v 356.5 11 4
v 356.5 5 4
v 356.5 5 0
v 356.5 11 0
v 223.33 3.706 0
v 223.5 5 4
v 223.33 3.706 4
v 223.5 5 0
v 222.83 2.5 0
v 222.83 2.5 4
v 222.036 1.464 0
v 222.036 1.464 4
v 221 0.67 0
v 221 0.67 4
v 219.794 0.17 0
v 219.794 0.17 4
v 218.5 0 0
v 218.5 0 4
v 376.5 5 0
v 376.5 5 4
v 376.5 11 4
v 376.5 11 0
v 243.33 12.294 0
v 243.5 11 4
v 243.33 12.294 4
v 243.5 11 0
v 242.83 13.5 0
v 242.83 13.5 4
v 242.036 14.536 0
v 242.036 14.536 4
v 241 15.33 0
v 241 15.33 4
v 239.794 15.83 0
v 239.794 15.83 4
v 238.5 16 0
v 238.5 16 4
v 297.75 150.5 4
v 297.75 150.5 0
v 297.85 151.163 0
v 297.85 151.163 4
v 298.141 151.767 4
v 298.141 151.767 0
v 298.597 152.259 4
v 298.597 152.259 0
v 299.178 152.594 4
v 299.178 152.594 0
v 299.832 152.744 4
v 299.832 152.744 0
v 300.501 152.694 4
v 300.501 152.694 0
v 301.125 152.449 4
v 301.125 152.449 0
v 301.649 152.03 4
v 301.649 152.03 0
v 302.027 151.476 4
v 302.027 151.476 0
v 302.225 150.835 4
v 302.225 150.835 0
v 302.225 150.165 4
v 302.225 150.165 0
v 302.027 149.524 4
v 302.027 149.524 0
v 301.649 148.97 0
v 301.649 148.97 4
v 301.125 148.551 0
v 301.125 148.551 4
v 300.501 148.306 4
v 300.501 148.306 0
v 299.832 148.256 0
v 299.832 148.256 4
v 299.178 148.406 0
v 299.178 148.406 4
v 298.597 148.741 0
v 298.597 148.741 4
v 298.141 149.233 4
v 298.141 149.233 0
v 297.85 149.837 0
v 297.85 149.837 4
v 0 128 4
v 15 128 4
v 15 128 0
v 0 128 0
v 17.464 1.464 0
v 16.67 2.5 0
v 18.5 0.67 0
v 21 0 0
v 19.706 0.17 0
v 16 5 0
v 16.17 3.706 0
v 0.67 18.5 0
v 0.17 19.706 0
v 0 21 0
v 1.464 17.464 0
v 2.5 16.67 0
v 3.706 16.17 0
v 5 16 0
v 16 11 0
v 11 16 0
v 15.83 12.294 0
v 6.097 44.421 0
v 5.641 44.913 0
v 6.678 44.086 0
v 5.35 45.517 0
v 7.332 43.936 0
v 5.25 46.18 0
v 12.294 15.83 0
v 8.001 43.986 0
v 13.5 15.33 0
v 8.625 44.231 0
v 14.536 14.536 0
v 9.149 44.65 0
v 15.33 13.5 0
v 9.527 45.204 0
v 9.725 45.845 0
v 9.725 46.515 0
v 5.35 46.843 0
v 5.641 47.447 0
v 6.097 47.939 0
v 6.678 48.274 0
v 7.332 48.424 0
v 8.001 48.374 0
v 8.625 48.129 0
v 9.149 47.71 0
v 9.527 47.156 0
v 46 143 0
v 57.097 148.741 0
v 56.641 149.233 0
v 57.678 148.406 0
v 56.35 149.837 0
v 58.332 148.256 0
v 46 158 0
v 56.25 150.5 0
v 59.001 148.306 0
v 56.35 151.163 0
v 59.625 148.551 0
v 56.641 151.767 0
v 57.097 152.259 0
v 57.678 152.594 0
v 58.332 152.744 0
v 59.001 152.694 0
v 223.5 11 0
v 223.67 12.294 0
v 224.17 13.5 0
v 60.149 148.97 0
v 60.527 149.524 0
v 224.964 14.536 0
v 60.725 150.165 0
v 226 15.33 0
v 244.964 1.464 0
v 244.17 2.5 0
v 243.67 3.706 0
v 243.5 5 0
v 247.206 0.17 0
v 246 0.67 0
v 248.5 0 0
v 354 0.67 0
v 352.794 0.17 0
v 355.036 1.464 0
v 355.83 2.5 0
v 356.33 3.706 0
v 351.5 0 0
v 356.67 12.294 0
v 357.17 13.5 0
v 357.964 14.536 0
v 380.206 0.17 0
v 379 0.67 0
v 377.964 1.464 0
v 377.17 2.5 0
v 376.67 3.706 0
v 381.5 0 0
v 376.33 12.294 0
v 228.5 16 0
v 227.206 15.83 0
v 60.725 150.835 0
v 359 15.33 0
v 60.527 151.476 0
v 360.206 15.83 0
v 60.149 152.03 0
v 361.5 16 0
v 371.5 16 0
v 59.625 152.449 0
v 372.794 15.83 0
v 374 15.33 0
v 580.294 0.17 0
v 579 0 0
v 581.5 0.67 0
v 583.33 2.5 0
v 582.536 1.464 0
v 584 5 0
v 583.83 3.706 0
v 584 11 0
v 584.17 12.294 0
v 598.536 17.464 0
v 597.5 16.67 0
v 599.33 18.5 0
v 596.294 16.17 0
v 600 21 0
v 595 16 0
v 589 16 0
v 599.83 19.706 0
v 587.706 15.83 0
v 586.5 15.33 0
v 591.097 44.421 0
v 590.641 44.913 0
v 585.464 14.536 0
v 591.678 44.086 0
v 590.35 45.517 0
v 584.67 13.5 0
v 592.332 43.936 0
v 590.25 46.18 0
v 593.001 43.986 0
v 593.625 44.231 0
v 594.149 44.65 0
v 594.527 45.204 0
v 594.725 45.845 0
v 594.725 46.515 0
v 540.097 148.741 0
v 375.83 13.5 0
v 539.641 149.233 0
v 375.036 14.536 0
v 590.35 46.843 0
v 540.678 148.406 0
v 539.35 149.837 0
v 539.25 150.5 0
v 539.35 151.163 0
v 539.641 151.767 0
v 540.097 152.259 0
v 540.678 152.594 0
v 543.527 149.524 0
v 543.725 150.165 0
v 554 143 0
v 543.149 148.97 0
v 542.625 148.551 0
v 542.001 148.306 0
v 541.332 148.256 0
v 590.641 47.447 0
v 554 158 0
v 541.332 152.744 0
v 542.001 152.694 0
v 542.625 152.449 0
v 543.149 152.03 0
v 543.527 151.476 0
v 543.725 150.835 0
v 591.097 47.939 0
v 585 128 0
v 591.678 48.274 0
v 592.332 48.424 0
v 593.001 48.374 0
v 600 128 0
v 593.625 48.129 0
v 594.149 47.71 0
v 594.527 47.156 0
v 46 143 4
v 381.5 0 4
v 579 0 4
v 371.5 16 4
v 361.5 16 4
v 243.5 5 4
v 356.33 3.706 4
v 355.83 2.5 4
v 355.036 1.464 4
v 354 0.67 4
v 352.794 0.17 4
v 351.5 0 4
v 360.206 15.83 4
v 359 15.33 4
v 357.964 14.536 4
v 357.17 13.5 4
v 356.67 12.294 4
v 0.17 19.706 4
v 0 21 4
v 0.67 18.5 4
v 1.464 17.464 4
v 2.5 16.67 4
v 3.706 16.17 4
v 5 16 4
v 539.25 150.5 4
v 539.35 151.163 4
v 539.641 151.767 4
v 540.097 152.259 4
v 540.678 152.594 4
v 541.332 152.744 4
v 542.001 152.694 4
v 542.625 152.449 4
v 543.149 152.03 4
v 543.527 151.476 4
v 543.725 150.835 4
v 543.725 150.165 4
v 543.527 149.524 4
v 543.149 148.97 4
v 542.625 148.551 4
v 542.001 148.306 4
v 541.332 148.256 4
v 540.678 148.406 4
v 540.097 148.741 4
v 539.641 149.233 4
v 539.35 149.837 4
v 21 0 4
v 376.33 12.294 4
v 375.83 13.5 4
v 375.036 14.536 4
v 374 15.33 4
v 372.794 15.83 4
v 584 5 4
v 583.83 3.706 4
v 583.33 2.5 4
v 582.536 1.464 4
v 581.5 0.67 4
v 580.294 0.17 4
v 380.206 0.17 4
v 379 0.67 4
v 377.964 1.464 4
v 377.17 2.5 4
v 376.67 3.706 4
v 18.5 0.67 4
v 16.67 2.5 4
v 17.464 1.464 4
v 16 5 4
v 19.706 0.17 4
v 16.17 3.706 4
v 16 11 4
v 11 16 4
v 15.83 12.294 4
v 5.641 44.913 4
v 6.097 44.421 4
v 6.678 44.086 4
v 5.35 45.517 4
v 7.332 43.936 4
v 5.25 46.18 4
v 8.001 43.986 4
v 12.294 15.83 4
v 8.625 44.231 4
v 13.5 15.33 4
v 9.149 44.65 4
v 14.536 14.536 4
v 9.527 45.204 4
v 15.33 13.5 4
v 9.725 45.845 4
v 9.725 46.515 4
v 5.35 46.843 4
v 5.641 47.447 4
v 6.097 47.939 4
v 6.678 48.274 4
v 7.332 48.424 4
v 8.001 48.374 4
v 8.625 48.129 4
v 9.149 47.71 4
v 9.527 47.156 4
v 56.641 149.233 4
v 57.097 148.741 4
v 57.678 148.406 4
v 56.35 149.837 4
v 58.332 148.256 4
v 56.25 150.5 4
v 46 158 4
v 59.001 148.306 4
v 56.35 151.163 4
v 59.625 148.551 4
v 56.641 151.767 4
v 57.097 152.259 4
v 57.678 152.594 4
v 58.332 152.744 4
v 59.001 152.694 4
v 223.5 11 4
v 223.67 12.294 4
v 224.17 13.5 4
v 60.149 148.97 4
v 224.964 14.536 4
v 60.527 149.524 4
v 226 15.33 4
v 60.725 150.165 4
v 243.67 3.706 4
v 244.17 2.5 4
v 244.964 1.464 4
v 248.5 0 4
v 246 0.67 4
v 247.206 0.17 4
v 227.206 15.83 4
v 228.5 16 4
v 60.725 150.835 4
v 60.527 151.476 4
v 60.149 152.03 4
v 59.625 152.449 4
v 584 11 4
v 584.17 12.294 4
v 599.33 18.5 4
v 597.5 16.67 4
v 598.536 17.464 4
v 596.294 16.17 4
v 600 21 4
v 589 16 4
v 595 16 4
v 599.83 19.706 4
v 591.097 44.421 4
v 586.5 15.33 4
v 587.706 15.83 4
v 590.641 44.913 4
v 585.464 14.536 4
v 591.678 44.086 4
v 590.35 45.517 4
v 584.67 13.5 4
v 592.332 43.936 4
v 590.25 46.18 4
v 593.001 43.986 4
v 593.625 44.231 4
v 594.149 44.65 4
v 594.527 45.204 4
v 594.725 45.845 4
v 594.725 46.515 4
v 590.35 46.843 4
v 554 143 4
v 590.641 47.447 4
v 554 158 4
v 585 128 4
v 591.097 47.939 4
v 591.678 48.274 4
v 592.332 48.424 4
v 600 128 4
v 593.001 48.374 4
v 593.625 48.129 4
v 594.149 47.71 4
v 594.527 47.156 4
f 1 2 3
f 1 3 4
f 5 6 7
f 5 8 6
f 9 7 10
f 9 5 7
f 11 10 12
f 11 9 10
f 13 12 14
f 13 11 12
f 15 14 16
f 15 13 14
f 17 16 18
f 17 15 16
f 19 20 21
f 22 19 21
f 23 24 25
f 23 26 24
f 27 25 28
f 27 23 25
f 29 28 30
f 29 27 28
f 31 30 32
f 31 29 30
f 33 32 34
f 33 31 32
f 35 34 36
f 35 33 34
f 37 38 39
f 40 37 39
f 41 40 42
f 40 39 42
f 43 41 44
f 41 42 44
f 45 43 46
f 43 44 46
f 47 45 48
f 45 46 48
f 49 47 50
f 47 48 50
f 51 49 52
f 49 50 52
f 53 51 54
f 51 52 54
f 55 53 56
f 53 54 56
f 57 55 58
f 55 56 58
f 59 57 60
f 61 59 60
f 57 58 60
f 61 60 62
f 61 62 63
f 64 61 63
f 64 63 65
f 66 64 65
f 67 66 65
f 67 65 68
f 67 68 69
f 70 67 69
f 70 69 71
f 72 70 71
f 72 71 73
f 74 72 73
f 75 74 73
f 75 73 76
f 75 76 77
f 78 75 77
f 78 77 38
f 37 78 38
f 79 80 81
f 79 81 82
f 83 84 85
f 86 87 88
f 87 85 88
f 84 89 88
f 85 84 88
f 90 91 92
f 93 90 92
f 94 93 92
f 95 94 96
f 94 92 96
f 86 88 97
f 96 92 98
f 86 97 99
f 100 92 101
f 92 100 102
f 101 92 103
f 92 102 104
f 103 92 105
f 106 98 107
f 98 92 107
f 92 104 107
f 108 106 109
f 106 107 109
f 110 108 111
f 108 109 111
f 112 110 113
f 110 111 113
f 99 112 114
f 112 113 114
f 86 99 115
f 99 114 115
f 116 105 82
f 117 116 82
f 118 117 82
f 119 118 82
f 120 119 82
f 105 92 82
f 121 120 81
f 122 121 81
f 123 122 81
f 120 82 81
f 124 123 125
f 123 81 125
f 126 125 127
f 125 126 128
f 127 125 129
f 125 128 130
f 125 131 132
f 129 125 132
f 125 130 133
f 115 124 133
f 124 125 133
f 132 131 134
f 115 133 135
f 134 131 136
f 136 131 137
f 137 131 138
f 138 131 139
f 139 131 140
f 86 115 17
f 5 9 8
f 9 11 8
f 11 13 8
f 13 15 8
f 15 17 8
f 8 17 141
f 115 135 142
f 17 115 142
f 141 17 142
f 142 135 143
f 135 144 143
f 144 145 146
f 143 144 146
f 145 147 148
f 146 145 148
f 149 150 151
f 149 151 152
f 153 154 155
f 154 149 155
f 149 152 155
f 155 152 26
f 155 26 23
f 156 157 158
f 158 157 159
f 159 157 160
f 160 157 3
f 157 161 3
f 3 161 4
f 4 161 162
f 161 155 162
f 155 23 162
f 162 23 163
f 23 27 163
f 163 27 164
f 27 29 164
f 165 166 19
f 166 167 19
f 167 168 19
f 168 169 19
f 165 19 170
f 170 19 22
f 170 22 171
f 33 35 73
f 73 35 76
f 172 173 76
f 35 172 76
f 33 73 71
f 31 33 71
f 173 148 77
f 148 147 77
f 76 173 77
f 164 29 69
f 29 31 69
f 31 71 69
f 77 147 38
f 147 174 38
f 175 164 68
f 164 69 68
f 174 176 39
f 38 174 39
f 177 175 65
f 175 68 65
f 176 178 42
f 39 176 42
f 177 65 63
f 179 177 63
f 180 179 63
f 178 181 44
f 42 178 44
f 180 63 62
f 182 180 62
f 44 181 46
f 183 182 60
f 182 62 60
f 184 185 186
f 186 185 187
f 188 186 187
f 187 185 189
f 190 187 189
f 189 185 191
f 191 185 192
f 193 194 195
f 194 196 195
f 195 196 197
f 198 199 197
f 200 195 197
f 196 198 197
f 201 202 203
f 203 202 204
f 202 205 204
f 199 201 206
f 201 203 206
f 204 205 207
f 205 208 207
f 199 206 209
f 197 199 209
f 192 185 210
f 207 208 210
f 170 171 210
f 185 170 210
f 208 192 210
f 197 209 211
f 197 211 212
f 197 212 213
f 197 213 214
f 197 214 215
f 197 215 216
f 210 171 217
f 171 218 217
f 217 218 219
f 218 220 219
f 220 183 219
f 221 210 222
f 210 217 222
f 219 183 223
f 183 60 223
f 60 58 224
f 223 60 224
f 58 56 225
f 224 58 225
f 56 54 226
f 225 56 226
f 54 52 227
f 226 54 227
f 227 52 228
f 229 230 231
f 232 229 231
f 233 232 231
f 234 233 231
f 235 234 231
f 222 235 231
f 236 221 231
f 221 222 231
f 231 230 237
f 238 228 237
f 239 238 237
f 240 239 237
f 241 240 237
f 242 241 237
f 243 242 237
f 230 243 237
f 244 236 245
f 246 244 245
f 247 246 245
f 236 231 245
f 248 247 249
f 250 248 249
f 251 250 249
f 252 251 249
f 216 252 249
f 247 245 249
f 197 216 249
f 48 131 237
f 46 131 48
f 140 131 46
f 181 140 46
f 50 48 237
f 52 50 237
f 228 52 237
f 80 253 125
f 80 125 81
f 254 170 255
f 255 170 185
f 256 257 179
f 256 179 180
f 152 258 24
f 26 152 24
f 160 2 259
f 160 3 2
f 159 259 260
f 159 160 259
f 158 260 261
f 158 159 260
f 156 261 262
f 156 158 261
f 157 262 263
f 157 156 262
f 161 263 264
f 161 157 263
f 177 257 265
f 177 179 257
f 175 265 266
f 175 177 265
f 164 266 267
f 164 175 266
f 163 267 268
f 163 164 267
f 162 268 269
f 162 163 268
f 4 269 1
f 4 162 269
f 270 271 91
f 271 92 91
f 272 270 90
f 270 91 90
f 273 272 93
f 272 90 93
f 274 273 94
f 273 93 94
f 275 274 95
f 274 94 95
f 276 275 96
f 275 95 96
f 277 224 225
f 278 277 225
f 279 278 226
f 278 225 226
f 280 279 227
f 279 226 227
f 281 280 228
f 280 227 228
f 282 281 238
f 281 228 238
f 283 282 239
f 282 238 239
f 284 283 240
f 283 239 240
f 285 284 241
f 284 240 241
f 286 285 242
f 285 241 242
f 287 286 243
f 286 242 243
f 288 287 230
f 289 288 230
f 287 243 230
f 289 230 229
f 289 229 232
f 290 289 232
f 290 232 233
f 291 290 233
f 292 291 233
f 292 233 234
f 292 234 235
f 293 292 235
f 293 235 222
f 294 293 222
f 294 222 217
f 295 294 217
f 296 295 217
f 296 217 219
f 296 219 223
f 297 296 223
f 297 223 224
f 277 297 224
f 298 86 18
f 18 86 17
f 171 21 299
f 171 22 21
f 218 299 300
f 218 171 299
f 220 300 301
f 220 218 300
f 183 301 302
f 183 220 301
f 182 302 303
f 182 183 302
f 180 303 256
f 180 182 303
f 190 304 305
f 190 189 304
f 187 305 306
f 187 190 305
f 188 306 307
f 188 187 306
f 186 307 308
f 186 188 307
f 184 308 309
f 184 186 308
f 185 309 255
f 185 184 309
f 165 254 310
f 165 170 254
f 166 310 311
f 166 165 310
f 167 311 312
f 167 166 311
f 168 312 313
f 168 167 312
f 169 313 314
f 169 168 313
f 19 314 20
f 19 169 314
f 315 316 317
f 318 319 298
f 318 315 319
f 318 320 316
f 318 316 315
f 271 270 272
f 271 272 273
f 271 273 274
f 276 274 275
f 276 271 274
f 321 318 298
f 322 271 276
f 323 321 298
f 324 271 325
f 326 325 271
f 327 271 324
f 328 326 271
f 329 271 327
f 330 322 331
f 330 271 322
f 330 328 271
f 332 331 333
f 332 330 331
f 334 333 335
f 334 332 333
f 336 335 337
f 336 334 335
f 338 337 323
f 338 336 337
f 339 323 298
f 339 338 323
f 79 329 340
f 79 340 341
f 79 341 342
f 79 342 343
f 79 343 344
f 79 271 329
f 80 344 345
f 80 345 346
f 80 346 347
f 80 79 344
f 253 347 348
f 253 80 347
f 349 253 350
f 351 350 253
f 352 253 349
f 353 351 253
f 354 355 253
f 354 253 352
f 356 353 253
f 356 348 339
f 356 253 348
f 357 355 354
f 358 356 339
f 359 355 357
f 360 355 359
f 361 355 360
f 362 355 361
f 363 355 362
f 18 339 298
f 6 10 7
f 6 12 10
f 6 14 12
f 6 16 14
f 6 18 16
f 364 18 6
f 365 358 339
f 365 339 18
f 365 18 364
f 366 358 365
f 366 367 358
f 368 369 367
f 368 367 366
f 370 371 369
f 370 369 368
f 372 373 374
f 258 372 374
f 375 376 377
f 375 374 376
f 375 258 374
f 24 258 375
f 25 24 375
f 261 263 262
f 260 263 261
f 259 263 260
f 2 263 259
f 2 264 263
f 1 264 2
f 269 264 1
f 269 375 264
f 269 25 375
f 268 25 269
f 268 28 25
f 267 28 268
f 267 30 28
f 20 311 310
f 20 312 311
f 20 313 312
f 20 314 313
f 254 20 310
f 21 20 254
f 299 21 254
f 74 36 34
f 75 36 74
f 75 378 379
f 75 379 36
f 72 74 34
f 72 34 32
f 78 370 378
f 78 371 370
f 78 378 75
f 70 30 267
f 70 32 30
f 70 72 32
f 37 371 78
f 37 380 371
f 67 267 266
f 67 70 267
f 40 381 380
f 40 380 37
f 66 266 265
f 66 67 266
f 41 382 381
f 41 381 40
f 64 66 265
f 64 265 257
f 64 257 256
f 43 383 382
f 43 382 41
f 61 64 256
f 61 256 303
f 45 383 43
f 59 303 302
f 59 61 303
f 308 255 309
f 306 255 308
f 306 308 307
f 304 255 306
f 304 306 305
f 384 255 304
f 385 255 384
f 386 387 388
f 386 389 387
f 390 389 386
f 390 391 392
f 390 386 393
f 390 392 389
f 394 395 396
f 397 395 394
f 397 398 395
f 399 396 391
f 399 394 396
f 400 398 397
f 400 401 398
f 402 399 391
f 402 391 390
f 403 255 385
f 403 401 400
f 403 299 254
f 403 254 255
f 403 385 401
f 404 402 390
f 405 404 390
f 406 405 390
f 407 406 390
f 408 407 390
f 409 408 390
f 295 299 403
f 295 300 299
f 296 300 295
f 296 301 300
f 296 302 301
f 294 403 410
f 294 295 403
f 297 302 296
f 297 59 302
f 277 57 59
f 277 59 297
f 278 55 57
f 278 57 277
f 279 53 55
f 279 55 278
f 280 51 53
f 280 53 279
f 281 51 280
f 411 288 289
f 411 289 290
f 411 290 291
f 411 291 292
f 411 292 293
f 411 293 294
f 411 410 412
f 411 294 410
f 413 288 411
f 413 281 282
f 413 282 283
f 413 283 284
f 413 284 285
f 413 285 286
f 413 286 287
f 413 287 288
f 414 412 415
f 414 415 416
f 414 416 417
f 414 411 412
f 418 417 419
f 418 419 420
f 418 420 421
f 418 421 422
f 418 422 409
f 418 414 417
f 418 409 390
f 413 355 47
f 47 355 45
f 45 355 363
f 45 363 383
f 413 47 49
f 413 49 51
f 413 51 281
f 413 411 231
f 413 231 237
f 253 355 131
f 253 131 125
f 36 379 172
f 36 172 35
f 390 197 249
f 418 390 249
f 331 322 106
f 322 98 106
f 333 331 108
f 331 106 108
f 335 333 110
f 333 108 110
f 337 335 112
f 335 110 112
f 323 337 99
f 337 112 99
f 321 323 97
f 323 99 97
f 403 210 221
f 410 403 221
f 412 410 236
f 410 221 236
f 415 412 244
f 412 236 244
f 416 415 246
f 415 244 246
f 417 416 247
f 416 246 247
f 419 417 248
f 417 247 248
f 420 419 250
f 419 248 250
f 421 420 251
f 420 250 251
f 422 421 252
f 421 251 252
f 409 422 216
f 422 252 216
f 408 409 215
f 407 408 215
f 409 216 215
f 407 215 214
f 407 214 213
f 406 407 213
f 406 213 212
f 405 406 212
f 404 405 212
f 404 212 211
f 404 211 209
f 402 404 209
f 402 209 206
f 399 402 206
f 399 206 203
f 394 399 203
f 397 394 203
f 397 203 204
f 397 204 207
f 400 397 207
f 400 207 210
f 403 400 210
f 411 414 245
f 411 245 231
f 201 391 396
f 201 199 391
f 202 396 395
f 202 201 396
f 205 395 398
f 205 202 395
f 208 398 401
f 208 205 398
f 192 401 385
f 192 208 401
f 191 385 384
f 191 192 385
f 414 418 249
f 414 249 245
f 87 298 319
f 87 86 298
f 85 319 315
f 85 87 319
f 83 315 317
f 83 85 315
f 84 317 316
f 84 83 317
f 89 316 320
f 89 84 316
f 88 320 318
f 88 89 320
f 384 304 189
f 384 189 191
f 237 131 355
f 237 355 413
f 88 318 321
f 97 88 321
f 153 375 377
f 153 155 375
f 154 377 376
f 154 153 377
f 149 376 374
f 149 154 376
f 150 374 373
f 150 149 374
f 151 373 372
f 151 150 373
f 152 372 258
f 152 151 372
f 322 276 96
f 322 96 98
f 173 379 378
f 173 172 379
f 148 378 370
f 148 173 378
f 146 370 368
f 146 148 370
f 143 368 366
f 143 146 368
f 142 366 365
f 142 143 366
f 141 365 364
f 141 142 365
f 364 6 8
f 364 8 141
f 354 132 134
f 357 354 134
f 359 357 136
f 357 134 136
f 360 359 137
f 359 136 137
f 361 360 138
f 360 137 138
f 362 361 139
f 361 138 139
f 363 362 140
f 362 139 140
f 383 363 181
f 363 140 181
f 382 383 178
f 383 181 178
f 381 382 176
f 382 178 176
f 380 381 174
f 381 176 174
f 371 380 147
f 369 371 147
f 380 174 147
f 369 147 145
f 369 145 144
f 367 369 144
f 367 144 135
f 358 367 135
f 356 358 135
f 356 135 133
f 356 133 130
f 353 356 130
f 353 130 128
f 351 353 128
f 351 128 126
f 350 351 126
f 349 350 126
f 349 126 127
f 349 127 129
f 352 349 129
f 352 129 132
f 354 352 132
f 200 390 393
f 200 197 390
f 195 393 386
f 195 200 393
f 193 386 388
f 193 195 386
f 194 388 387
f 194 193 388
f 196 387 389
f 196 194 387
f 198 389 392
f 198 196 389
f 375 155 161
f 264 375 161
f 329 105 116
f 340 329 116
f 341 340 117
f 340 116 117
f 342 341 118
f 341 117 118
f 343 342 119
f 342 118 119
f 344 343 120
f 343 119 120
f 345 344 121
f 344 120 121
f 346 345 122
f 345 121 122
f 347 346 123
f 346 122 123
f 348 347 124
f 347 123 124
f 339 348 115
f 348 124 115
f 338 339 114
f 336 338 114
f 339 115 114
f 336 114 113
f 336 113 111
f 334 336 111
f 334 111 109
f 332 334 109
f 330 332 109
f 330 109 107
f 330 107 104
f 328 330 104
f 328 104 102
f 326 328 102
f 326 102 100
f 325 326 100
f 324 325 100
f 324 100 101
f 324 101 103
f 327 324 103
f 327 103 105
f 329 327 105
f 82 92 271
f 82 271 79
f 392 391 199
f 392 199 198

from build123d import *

# Parameters (mm, degrees)
SKETCH_1_W          = 600
SKETCH_1_H          = 158
EXTRUDE_1_DEPTH     = 4
SKETCH_2_W          = 20
SKETCH_2_H          = 16
SKETCH_2_W_2        = 16
CUT_EXTRUDE_1_DEPTH = 10
FILLET_1_R          = 5
HOLE_WIZARD_M4_1_D  = 4.5


with BuildPart() as part:
    # ｽｹｯﾁ1 → ﾎﾞｽ - 押し出し1 (new body)
    with BuildSketch(Plane.XY):
        with Locations((300, 79)):
            Rectangle(SKETCH_1_W, SKETCH_1_H)
    extrude(amount=EXTRUDE_1_DEPTH)

    # ｽｹｯﾁ2 → ｶｯﾄ - 押し出し1 (cut)
    with BuildSketch(Plane.XY.offset(4)):
        Polygon((46, 158), (46, 143), (15, 128), (0, 128), (0, 158), align=None)
        Polygon((600, 158), (600, 128), (585, 128), (554, 143), (554, 158), align=None)
        with Locations((366.5, 8)):
            Rectangle(SKETCH_2_W, SKETCH_2_H)
        with Locations((8, 8)):
            Rectangle(SKETCH_2_W_2, SKETCH_2_H)
        with Locations((233.5, 8)):
            Rectangle(SKETCH_2_W, SKETCH_2_H)
        with Locations((592, 8)):
            Rectangle(SKETCH_2_W_2, SKETCH_2_H)
    extrude(amount=-CUT_EXTRUDE_1_DEPTH, mode=Mode.SUBTRACT)

    # ﾌｨﾚｯﾄ1
    fillet_1_edges = [part.edges().sort_by_distance(p)[0] for p in [
        (376.5, 0, 2),
        (356.5, 0, 2),
        (356.5, 16, 2),
        (376.5, 16, 2),
        (223.5, 0, 2),
        (223.5, 16, 2),
        (243.5, 16, 2),
        (243.5, 0, 2),
        (0, 16, 2),
        (16, 16, 2),
        (16, 0, 2),
        (584, 16, 2),
        (600, 16, 2),
        (584, 0, 2),
    ]]
    fillet(fillet_1_edges, radius=FILLET_1_R)

    # M4 すきま穴1 (through all)
    with Locations(Plane.XY.offset(4)):
        with Locations((58.5, 150.5), (300, 150.5), (541.5, 150.5), (592.5, 46.18), (7.5, 46.18)):
            Hole(HOLE_WIZARD_M4_1_D / 2)


solid = part.part
